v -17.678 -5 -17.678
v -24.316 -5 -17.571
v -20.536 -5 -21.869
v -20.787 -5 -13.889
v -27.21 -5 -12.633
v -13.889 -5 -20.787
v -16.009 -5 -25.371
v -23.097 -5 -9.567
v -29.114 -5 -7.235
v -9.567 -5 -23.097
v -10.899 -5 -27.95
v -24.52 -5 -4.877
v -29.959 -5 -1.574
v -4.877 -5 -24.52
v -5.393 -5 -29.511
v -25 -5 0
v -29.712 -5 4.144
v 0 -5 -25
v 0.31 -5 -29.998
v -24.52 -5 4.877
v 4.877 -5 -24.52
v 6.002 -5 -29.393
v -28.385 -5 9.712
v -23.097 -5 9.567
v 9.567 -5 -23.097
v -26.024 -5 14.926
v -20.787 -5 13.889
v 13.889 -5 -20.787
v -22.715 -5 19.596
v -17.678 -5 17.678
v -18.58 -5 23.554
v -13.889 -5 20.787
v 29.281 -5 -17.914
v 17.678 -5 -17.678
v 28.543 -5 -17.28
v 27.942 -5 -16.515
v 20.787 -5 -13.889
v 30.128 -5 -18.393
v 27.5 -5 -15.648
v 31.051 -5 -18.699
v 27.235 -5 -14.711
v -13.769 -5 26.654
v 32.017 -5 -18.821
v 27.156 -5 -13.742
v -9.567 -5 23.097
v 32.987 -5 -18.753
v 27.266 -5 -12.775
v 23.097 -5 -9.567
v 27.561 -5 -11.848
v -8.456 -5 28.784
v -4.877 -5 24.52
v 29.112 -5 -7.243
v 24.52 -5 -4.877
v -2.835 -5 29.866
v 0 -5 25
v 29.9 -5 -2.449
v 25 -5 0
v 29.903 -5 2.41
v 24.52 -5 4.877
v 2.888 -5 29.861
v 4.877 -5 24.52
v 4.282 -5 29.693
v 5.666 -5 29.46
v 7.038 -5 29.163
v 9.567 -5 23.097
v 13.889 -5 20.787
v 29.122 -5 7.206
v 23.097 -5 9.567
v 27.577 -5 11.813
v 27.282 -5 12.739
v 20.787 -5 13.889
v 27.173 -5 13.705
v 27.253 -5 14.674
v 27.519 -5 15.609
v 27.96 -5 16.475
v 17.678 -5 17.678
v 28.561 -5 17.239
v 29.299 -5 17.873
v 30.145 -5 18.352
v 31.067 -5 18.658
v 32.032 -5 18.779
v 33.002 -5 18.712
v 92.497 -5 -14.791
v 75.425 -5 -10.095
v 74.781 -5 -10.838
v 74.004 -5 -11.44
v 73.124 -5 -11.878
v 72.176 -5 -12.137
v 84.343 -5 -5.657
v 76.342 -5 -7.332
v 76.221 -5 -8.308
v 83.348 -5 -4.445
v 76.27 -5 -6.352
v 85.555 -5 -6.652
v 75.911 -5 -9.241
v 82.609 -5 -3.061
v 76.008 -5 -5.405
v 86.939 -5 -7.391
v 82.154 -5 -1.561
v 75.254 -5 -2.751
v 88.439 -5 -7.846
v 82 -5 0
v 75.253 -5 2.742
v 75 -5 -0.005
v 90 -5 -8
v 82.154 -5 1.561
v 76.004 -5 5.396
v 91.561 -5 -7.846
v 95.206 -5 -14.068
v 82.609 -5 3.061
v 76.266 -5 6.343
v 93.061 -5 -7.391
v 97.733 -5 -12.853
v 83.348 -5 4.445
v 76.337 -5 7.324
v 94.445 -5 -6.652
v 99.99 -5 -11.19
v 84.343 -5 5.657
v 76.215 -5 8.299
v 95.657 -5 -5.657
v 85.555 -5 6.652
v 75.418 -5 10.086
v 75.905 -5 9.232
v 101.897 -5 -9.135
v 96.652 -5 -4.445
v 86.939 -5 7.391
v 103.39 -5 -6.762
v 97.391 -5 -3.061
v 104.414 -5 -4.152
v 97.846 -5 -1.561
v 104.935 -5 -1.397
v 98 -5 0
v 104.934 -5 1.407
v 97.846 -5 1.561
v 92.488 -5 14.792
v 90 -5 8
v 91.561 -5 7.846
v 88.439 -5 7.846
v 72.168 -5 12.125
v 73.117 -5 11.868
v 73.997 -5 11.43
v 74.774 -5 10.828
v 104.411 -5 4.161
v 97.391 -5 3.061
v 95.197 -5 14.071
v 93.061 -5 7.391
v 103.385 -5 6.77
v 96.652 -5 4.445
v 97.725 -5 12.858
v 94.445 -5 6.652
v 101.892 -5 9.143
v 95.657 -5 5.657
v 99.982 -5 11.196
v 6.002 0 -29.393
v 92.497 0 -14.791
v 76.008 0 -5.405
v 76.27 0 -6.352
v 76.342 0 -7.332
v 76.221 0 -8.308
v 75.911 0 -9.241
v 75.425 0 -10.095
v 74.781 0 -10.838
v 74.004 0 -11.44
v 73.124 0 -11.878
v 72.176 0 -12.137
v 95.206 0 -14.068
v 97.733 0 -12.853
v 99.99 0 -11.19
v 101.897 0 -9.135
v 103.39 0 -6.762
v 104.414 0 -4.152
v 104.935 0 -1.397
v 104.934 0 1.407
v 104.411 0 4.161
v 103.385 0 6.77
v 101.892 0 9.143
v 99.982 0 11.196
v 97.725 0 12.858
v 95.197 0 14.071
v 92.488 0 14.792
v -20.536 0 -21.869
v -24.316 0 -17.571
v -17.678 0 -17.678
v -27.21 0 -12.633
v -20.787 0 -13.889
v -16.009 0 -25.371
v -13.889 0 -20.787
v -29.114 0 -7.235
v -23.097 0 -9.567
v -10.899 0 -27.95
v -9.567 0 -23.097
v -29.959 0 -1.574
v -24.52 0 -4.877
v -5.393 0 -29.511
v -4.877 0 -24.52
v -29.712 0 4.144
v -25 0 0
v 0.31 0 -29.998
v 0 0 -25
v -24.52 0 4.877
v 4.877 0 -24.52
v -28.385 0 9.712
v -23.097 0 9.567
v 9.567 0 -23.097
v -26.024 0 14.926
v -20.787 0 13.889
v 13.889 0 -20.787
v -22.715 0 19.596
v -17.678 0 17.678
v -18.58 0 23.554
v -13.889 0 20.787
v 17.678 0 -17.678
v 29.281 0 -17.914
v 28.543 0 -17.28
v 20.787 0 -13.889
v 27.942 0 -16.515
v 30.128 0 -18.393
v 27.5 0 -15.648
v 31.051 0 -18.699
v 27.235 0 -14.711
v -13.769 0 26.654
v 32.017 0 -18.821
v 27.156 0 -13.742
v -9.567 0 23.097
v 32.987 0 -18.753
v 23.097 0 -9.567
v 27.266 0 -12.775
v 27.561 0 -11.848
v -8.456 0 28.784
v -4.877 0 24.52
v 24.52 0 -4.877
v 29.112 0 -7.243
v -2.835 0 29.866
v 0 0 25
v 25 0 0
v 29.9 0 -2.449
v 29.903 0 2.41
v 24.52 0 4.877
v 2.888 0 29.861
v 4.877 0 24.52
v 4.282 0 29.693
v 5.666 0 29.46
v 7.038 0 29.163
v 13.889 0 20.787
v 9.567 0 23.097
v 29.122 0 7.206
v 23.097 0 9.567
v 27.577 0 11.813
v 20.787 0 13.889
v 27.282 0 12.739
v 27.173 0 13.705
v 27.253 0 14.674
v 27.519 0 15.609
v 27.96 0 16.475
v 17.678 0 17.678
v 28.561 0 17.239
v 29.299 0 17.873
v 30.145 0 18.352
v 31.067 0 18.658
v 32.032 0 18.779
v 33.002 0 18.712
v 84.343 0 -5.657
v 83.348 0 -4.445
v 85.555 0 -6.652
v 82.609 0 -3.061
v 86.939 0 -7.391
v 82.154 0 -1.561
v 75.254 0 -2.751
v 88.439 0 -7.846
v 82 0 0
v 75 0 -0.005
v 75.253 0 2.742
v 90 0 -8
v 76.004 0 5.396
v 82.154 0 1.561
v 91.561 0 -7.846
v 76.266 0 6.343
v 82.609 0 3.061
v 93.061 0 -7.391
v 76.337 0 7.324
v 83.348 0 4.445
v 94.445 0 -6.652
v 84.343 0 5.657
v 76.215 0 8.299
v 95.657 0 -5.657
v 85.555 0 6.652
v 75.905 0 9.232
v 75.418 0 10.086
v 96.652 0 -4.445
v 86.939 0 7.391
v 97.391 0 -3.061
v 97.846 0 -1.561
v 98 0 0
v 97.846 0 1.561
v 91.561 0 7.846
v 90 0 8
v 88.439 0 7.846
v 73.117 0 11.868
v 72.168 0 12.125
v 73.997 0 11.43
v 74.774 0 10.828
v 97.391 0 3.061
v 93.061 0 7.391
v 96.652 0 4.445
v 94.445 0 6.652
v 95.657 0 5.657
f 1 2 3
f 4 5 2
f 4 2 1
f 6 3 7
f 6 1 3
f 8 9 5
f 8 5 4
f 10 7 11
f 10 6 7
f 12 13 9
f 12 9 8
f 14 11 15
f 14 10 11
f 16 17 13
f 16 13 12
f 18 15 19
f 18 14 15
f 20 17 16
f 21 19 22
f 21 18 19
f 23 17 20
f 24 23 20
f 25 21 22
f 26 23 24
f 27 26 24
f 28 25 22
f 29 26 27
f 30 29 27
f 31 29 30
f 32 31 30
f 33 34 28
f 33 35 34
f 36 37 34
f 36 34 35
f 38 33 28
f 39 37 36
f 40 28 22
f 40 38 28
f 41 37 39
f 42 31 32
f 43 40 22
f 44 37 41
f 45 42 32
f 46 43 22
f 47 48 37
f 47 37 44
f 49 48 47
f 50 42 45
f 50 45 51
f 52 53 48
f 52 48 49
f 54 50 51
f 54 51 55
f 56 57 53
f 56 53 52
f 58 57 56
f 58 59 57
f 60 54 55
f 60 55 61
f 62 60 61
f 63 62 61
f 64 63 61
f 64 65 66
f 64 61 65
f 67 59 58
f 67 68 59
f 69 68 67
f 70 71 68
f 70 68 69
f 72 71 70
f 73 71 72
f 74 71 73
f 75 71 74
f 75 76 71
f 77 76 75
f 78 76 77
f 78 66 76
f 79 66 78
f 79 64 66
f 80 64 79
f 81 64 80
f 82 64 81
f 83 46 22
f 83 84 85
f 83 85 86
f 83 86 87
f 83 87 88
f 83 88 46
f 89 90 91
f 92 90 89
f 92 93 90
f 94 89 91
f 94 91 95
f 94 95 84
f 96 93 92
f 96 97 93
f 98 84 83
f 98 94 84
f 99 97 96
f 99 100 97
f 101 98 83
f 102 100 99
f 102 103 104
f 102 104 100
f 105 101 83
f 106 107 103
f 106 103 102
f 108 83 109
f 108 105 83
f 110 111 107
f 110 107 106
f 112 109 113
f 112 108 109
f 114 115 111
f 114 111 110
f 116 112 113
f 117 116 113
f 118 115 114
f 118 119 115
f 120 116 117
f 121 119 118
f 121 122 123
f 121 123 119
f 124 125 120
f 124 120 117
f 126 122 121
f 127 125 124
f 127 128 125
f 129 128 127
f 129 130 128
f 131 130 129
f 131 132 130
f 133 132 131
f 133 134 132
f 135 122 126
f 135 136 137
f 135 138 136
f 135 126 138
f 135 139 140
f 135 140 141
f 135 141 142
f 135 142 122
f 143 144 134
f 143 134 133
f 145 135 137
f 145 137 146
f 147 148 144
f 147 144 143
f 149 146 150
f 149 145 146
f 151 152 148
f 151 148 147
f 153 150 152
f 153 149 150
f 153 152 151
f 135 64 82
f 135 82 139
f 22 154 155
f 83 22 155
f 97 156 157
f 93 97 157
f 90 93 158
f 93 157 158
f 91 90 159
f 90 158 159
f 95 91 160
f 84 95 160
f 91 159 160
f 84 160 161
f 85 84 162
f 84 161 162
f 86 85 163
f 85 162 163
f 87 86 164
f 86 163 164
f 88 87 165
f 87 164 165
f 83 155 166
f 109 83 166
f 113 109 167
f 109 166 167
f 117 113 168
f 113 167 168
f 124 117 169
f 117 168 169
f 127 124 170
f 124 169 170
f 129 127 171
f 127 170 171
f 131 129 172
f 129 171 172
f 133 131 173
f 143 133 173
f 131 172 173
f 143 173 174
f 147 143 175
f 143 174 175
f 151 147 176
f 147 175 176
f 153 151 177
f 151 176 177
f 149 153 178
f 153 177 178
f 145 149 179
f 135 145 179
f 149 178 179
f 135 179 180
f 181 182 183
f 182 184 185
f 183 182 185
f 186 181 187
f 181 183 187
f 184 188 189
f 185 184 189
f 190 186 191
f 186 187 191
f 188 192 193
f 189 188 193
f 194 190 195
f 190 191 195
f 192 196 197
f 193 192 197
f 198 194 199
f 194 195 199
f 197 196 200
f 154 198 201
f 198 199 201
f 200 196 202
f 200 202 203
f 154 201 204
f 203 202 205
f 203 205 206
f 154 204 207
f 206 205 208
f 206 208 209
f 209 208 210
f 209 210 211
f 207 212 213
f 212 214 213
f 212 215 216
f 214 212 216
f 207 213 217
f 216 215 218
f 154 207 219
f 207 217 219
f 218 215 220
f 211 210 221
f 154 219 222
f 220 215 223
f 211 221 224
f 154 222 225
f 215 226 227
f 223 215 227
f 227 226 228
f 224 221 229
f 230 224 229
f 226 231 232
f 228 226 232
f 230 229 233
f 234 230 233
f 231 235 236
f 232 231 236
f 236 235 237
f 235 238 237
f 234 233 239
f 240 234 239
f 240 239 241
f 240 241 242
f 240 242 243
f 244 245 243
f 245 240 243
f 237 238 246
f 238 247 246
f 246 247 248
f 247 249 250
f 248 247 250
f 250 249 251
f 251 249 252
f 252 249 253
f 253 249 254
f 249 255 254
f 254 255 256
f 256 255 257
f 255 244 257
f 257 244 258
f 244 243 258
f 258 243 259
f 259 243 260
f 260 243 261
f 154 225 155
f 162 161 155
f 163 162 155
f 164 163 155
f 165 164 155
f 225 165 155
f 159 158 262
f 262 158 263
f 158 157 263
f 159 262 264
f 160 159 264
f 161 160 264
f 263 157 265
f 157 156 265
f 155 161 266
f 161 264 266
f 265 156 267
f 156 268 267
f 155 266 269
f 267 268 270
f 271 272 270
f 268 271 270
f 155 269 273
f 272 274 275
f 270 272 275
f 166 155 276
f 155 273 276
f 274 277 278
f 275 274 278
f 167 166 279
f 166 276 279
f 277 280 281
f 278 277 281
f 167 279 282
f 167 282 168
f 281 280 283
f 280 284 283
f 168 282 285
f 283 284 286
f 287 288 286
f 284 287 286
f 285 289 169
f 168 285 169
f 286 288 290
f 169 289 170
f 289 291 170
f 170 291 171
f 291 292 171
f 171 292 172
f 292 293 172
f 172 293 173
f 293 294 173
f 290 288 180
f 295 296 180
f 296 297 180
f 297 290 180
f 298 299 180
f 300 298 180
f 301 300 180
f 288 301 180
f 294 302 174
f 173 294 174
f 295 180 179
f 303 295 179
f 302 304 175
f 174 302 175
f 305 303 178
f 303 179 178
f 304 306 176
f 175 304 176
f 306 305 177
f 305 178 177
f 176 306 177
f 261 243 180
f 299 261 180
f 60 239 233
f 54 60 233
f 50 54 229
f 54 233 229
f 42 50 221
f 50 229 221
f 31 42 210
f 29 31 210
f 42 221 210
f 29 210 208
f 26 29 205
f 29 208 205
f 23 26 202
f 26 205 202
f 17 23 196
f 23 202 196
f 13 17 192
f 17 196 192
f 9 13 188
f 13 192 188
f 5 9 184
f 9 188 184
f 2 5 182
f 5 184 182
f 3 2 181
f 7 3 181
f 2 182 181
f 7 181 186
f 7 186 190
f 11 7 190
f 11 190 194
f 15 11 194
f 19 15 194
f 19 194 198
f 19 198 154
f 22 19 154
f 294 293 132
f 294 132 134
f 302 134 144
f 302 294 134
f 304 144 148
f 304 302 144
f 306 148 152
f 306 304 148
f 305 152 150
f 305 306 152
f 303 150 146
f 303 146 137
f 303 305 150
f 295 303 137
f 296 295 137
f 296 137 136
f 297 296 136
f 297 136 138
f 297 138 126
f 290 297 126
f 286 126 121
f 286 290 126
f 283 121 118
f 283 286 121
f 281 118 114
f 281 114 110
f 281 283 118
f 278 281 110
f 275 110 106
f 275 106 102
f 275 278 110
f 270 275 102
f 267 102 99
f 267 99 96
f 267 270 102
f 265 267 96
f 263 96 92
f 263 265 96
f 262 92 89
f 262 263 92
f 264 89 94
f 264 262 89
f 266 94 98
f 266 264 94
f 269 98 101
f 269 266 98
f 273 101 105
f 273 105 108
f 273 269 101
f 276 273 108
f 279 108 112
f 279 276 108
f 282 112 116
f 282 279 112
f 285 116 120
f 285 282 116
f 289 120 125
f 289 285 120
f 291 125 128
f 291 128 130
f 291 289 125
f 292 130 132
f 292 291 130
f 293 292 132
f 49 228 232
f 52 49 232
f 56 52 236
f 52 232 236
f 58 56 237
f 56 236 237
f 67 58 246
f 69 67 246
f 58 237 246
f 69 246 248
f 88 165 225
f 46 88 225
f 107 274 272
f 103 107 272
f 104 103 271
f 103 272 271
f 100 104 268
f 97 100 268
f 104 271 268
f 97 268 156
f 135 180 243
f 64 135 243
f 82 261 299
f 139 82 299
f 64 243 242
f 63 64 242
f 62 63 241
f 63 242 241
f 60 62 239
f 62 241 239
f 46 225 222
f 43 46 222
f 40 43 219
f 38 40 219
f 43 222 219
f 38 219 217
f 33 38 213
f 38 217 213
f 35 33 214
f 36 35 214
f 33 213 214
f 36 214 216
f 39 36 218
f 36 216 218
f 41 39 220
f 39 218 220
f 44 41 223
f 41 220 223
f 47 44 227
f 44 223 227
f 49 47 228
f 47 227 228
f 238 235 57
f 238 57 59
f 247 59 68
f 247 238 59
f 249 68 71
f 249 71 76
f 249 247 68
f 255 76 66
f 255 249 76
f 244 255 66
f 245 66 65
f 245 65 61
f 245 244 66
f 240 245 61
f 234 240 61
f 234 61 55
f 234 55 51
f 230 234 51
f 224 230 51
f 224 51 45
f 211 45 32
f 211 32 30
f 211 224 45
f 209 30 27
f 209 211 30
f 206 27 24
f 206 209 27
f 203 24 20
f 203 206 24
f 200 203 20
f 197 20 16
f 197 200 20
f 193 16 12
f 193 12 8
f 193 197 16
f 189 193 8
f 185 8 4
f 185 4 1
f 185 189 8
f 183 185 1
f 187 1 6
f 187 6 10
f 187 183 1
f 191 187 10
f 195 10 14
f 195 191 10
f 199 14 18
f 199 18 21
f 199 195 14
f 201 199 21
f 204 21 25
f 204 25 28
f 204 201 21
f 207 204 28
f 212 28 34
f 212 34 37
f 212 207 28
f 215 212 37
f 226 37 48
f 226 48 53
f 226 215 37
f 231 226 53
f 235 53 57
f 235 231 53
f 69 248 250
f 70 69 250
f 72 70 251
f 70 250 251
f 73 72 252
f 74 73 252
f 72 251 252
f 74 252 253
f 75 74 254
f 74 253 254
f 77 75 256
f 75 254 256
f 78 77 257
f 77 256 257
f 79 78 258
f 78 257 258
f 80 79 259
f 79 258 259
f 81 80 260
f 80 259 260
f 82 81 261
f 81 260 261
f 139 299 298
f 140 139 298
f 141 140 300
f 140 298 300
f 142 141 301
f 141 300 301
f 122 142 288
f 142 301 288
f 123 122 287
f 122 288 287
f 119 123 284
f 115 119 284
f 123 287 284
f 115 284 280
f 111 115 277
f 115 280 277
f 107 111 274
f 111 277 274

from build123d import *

# Parameters (mm, degrees)
F0_R     = 25
F0_R_2   = 8
F1_DEPTH = 5


with BuildPart() as f1:
    # F0 (on Front) → F1 (new body)
    with BuildSketch(Plane.XZ):
        with BuildLine():
            Line((2.888273, 29.860641), (7.037978, 29.162765))
            ThreePointArc((7.037978, 29.162765), (4.975377, 29.584551), (2.888273, 29.860641))
        make_face()
        with BuildLine():
            Line((92.487688, 14.792275), (7.037978, 29.162765))
            Line((7.037978, 29.162765), (2.888273, 29.860641))
            ThreePointArc((2.888273, 29.860641), (-29.958665, -1.5743), (6.002022, -29.393464))
            Line((6.002022, -29.393464), (92.49708, -14.790693))
            ThreePointArc((92.49708, -14.790693), (104.999999, 0.004762), (92.487688, 14.792275))
        make_face()
        with BuildLine():
            ThreePointArc((27.576515, 11.812529), (28.24219, 16.871895), (33.00183, 18.712042))
            Line((33.00183, 18.712042), (72.168065, 12.125267))
            ThreePointArc((72.168065, 12.125267), (75.682636, 9.670676), (76.004127, 5.395882))
            ThreePointArc((76.004127, 5.395882), (75.000001, -0.004762), (76.007556, -5.404768))
            ThreePointArc((76.007556, -5.404768), (75.688779, -9.679765), (72.175768, -12.136588))
            Line((72.175768, -12.136588), (32.987291, -18.752693))
            ThreePointArc((32.987291, -18.752693), (28.223524, -16.911805), (27.561369, -11.847824))
            ThreePointArc((27.561369, -11.847824), (29.999994, -0.019204), (27.576515, 11.812529))
        make_face(mode=Mode.SUBTRACT)
        Circle(F0_R, mode=Mode.SUBTRACT)
        with Locations((90, 0)):
            Circle(F0_R_2, mode=Mode.SUBTRACT)
    extrude(amount=F1_DEPTH)


solid = f1.part
